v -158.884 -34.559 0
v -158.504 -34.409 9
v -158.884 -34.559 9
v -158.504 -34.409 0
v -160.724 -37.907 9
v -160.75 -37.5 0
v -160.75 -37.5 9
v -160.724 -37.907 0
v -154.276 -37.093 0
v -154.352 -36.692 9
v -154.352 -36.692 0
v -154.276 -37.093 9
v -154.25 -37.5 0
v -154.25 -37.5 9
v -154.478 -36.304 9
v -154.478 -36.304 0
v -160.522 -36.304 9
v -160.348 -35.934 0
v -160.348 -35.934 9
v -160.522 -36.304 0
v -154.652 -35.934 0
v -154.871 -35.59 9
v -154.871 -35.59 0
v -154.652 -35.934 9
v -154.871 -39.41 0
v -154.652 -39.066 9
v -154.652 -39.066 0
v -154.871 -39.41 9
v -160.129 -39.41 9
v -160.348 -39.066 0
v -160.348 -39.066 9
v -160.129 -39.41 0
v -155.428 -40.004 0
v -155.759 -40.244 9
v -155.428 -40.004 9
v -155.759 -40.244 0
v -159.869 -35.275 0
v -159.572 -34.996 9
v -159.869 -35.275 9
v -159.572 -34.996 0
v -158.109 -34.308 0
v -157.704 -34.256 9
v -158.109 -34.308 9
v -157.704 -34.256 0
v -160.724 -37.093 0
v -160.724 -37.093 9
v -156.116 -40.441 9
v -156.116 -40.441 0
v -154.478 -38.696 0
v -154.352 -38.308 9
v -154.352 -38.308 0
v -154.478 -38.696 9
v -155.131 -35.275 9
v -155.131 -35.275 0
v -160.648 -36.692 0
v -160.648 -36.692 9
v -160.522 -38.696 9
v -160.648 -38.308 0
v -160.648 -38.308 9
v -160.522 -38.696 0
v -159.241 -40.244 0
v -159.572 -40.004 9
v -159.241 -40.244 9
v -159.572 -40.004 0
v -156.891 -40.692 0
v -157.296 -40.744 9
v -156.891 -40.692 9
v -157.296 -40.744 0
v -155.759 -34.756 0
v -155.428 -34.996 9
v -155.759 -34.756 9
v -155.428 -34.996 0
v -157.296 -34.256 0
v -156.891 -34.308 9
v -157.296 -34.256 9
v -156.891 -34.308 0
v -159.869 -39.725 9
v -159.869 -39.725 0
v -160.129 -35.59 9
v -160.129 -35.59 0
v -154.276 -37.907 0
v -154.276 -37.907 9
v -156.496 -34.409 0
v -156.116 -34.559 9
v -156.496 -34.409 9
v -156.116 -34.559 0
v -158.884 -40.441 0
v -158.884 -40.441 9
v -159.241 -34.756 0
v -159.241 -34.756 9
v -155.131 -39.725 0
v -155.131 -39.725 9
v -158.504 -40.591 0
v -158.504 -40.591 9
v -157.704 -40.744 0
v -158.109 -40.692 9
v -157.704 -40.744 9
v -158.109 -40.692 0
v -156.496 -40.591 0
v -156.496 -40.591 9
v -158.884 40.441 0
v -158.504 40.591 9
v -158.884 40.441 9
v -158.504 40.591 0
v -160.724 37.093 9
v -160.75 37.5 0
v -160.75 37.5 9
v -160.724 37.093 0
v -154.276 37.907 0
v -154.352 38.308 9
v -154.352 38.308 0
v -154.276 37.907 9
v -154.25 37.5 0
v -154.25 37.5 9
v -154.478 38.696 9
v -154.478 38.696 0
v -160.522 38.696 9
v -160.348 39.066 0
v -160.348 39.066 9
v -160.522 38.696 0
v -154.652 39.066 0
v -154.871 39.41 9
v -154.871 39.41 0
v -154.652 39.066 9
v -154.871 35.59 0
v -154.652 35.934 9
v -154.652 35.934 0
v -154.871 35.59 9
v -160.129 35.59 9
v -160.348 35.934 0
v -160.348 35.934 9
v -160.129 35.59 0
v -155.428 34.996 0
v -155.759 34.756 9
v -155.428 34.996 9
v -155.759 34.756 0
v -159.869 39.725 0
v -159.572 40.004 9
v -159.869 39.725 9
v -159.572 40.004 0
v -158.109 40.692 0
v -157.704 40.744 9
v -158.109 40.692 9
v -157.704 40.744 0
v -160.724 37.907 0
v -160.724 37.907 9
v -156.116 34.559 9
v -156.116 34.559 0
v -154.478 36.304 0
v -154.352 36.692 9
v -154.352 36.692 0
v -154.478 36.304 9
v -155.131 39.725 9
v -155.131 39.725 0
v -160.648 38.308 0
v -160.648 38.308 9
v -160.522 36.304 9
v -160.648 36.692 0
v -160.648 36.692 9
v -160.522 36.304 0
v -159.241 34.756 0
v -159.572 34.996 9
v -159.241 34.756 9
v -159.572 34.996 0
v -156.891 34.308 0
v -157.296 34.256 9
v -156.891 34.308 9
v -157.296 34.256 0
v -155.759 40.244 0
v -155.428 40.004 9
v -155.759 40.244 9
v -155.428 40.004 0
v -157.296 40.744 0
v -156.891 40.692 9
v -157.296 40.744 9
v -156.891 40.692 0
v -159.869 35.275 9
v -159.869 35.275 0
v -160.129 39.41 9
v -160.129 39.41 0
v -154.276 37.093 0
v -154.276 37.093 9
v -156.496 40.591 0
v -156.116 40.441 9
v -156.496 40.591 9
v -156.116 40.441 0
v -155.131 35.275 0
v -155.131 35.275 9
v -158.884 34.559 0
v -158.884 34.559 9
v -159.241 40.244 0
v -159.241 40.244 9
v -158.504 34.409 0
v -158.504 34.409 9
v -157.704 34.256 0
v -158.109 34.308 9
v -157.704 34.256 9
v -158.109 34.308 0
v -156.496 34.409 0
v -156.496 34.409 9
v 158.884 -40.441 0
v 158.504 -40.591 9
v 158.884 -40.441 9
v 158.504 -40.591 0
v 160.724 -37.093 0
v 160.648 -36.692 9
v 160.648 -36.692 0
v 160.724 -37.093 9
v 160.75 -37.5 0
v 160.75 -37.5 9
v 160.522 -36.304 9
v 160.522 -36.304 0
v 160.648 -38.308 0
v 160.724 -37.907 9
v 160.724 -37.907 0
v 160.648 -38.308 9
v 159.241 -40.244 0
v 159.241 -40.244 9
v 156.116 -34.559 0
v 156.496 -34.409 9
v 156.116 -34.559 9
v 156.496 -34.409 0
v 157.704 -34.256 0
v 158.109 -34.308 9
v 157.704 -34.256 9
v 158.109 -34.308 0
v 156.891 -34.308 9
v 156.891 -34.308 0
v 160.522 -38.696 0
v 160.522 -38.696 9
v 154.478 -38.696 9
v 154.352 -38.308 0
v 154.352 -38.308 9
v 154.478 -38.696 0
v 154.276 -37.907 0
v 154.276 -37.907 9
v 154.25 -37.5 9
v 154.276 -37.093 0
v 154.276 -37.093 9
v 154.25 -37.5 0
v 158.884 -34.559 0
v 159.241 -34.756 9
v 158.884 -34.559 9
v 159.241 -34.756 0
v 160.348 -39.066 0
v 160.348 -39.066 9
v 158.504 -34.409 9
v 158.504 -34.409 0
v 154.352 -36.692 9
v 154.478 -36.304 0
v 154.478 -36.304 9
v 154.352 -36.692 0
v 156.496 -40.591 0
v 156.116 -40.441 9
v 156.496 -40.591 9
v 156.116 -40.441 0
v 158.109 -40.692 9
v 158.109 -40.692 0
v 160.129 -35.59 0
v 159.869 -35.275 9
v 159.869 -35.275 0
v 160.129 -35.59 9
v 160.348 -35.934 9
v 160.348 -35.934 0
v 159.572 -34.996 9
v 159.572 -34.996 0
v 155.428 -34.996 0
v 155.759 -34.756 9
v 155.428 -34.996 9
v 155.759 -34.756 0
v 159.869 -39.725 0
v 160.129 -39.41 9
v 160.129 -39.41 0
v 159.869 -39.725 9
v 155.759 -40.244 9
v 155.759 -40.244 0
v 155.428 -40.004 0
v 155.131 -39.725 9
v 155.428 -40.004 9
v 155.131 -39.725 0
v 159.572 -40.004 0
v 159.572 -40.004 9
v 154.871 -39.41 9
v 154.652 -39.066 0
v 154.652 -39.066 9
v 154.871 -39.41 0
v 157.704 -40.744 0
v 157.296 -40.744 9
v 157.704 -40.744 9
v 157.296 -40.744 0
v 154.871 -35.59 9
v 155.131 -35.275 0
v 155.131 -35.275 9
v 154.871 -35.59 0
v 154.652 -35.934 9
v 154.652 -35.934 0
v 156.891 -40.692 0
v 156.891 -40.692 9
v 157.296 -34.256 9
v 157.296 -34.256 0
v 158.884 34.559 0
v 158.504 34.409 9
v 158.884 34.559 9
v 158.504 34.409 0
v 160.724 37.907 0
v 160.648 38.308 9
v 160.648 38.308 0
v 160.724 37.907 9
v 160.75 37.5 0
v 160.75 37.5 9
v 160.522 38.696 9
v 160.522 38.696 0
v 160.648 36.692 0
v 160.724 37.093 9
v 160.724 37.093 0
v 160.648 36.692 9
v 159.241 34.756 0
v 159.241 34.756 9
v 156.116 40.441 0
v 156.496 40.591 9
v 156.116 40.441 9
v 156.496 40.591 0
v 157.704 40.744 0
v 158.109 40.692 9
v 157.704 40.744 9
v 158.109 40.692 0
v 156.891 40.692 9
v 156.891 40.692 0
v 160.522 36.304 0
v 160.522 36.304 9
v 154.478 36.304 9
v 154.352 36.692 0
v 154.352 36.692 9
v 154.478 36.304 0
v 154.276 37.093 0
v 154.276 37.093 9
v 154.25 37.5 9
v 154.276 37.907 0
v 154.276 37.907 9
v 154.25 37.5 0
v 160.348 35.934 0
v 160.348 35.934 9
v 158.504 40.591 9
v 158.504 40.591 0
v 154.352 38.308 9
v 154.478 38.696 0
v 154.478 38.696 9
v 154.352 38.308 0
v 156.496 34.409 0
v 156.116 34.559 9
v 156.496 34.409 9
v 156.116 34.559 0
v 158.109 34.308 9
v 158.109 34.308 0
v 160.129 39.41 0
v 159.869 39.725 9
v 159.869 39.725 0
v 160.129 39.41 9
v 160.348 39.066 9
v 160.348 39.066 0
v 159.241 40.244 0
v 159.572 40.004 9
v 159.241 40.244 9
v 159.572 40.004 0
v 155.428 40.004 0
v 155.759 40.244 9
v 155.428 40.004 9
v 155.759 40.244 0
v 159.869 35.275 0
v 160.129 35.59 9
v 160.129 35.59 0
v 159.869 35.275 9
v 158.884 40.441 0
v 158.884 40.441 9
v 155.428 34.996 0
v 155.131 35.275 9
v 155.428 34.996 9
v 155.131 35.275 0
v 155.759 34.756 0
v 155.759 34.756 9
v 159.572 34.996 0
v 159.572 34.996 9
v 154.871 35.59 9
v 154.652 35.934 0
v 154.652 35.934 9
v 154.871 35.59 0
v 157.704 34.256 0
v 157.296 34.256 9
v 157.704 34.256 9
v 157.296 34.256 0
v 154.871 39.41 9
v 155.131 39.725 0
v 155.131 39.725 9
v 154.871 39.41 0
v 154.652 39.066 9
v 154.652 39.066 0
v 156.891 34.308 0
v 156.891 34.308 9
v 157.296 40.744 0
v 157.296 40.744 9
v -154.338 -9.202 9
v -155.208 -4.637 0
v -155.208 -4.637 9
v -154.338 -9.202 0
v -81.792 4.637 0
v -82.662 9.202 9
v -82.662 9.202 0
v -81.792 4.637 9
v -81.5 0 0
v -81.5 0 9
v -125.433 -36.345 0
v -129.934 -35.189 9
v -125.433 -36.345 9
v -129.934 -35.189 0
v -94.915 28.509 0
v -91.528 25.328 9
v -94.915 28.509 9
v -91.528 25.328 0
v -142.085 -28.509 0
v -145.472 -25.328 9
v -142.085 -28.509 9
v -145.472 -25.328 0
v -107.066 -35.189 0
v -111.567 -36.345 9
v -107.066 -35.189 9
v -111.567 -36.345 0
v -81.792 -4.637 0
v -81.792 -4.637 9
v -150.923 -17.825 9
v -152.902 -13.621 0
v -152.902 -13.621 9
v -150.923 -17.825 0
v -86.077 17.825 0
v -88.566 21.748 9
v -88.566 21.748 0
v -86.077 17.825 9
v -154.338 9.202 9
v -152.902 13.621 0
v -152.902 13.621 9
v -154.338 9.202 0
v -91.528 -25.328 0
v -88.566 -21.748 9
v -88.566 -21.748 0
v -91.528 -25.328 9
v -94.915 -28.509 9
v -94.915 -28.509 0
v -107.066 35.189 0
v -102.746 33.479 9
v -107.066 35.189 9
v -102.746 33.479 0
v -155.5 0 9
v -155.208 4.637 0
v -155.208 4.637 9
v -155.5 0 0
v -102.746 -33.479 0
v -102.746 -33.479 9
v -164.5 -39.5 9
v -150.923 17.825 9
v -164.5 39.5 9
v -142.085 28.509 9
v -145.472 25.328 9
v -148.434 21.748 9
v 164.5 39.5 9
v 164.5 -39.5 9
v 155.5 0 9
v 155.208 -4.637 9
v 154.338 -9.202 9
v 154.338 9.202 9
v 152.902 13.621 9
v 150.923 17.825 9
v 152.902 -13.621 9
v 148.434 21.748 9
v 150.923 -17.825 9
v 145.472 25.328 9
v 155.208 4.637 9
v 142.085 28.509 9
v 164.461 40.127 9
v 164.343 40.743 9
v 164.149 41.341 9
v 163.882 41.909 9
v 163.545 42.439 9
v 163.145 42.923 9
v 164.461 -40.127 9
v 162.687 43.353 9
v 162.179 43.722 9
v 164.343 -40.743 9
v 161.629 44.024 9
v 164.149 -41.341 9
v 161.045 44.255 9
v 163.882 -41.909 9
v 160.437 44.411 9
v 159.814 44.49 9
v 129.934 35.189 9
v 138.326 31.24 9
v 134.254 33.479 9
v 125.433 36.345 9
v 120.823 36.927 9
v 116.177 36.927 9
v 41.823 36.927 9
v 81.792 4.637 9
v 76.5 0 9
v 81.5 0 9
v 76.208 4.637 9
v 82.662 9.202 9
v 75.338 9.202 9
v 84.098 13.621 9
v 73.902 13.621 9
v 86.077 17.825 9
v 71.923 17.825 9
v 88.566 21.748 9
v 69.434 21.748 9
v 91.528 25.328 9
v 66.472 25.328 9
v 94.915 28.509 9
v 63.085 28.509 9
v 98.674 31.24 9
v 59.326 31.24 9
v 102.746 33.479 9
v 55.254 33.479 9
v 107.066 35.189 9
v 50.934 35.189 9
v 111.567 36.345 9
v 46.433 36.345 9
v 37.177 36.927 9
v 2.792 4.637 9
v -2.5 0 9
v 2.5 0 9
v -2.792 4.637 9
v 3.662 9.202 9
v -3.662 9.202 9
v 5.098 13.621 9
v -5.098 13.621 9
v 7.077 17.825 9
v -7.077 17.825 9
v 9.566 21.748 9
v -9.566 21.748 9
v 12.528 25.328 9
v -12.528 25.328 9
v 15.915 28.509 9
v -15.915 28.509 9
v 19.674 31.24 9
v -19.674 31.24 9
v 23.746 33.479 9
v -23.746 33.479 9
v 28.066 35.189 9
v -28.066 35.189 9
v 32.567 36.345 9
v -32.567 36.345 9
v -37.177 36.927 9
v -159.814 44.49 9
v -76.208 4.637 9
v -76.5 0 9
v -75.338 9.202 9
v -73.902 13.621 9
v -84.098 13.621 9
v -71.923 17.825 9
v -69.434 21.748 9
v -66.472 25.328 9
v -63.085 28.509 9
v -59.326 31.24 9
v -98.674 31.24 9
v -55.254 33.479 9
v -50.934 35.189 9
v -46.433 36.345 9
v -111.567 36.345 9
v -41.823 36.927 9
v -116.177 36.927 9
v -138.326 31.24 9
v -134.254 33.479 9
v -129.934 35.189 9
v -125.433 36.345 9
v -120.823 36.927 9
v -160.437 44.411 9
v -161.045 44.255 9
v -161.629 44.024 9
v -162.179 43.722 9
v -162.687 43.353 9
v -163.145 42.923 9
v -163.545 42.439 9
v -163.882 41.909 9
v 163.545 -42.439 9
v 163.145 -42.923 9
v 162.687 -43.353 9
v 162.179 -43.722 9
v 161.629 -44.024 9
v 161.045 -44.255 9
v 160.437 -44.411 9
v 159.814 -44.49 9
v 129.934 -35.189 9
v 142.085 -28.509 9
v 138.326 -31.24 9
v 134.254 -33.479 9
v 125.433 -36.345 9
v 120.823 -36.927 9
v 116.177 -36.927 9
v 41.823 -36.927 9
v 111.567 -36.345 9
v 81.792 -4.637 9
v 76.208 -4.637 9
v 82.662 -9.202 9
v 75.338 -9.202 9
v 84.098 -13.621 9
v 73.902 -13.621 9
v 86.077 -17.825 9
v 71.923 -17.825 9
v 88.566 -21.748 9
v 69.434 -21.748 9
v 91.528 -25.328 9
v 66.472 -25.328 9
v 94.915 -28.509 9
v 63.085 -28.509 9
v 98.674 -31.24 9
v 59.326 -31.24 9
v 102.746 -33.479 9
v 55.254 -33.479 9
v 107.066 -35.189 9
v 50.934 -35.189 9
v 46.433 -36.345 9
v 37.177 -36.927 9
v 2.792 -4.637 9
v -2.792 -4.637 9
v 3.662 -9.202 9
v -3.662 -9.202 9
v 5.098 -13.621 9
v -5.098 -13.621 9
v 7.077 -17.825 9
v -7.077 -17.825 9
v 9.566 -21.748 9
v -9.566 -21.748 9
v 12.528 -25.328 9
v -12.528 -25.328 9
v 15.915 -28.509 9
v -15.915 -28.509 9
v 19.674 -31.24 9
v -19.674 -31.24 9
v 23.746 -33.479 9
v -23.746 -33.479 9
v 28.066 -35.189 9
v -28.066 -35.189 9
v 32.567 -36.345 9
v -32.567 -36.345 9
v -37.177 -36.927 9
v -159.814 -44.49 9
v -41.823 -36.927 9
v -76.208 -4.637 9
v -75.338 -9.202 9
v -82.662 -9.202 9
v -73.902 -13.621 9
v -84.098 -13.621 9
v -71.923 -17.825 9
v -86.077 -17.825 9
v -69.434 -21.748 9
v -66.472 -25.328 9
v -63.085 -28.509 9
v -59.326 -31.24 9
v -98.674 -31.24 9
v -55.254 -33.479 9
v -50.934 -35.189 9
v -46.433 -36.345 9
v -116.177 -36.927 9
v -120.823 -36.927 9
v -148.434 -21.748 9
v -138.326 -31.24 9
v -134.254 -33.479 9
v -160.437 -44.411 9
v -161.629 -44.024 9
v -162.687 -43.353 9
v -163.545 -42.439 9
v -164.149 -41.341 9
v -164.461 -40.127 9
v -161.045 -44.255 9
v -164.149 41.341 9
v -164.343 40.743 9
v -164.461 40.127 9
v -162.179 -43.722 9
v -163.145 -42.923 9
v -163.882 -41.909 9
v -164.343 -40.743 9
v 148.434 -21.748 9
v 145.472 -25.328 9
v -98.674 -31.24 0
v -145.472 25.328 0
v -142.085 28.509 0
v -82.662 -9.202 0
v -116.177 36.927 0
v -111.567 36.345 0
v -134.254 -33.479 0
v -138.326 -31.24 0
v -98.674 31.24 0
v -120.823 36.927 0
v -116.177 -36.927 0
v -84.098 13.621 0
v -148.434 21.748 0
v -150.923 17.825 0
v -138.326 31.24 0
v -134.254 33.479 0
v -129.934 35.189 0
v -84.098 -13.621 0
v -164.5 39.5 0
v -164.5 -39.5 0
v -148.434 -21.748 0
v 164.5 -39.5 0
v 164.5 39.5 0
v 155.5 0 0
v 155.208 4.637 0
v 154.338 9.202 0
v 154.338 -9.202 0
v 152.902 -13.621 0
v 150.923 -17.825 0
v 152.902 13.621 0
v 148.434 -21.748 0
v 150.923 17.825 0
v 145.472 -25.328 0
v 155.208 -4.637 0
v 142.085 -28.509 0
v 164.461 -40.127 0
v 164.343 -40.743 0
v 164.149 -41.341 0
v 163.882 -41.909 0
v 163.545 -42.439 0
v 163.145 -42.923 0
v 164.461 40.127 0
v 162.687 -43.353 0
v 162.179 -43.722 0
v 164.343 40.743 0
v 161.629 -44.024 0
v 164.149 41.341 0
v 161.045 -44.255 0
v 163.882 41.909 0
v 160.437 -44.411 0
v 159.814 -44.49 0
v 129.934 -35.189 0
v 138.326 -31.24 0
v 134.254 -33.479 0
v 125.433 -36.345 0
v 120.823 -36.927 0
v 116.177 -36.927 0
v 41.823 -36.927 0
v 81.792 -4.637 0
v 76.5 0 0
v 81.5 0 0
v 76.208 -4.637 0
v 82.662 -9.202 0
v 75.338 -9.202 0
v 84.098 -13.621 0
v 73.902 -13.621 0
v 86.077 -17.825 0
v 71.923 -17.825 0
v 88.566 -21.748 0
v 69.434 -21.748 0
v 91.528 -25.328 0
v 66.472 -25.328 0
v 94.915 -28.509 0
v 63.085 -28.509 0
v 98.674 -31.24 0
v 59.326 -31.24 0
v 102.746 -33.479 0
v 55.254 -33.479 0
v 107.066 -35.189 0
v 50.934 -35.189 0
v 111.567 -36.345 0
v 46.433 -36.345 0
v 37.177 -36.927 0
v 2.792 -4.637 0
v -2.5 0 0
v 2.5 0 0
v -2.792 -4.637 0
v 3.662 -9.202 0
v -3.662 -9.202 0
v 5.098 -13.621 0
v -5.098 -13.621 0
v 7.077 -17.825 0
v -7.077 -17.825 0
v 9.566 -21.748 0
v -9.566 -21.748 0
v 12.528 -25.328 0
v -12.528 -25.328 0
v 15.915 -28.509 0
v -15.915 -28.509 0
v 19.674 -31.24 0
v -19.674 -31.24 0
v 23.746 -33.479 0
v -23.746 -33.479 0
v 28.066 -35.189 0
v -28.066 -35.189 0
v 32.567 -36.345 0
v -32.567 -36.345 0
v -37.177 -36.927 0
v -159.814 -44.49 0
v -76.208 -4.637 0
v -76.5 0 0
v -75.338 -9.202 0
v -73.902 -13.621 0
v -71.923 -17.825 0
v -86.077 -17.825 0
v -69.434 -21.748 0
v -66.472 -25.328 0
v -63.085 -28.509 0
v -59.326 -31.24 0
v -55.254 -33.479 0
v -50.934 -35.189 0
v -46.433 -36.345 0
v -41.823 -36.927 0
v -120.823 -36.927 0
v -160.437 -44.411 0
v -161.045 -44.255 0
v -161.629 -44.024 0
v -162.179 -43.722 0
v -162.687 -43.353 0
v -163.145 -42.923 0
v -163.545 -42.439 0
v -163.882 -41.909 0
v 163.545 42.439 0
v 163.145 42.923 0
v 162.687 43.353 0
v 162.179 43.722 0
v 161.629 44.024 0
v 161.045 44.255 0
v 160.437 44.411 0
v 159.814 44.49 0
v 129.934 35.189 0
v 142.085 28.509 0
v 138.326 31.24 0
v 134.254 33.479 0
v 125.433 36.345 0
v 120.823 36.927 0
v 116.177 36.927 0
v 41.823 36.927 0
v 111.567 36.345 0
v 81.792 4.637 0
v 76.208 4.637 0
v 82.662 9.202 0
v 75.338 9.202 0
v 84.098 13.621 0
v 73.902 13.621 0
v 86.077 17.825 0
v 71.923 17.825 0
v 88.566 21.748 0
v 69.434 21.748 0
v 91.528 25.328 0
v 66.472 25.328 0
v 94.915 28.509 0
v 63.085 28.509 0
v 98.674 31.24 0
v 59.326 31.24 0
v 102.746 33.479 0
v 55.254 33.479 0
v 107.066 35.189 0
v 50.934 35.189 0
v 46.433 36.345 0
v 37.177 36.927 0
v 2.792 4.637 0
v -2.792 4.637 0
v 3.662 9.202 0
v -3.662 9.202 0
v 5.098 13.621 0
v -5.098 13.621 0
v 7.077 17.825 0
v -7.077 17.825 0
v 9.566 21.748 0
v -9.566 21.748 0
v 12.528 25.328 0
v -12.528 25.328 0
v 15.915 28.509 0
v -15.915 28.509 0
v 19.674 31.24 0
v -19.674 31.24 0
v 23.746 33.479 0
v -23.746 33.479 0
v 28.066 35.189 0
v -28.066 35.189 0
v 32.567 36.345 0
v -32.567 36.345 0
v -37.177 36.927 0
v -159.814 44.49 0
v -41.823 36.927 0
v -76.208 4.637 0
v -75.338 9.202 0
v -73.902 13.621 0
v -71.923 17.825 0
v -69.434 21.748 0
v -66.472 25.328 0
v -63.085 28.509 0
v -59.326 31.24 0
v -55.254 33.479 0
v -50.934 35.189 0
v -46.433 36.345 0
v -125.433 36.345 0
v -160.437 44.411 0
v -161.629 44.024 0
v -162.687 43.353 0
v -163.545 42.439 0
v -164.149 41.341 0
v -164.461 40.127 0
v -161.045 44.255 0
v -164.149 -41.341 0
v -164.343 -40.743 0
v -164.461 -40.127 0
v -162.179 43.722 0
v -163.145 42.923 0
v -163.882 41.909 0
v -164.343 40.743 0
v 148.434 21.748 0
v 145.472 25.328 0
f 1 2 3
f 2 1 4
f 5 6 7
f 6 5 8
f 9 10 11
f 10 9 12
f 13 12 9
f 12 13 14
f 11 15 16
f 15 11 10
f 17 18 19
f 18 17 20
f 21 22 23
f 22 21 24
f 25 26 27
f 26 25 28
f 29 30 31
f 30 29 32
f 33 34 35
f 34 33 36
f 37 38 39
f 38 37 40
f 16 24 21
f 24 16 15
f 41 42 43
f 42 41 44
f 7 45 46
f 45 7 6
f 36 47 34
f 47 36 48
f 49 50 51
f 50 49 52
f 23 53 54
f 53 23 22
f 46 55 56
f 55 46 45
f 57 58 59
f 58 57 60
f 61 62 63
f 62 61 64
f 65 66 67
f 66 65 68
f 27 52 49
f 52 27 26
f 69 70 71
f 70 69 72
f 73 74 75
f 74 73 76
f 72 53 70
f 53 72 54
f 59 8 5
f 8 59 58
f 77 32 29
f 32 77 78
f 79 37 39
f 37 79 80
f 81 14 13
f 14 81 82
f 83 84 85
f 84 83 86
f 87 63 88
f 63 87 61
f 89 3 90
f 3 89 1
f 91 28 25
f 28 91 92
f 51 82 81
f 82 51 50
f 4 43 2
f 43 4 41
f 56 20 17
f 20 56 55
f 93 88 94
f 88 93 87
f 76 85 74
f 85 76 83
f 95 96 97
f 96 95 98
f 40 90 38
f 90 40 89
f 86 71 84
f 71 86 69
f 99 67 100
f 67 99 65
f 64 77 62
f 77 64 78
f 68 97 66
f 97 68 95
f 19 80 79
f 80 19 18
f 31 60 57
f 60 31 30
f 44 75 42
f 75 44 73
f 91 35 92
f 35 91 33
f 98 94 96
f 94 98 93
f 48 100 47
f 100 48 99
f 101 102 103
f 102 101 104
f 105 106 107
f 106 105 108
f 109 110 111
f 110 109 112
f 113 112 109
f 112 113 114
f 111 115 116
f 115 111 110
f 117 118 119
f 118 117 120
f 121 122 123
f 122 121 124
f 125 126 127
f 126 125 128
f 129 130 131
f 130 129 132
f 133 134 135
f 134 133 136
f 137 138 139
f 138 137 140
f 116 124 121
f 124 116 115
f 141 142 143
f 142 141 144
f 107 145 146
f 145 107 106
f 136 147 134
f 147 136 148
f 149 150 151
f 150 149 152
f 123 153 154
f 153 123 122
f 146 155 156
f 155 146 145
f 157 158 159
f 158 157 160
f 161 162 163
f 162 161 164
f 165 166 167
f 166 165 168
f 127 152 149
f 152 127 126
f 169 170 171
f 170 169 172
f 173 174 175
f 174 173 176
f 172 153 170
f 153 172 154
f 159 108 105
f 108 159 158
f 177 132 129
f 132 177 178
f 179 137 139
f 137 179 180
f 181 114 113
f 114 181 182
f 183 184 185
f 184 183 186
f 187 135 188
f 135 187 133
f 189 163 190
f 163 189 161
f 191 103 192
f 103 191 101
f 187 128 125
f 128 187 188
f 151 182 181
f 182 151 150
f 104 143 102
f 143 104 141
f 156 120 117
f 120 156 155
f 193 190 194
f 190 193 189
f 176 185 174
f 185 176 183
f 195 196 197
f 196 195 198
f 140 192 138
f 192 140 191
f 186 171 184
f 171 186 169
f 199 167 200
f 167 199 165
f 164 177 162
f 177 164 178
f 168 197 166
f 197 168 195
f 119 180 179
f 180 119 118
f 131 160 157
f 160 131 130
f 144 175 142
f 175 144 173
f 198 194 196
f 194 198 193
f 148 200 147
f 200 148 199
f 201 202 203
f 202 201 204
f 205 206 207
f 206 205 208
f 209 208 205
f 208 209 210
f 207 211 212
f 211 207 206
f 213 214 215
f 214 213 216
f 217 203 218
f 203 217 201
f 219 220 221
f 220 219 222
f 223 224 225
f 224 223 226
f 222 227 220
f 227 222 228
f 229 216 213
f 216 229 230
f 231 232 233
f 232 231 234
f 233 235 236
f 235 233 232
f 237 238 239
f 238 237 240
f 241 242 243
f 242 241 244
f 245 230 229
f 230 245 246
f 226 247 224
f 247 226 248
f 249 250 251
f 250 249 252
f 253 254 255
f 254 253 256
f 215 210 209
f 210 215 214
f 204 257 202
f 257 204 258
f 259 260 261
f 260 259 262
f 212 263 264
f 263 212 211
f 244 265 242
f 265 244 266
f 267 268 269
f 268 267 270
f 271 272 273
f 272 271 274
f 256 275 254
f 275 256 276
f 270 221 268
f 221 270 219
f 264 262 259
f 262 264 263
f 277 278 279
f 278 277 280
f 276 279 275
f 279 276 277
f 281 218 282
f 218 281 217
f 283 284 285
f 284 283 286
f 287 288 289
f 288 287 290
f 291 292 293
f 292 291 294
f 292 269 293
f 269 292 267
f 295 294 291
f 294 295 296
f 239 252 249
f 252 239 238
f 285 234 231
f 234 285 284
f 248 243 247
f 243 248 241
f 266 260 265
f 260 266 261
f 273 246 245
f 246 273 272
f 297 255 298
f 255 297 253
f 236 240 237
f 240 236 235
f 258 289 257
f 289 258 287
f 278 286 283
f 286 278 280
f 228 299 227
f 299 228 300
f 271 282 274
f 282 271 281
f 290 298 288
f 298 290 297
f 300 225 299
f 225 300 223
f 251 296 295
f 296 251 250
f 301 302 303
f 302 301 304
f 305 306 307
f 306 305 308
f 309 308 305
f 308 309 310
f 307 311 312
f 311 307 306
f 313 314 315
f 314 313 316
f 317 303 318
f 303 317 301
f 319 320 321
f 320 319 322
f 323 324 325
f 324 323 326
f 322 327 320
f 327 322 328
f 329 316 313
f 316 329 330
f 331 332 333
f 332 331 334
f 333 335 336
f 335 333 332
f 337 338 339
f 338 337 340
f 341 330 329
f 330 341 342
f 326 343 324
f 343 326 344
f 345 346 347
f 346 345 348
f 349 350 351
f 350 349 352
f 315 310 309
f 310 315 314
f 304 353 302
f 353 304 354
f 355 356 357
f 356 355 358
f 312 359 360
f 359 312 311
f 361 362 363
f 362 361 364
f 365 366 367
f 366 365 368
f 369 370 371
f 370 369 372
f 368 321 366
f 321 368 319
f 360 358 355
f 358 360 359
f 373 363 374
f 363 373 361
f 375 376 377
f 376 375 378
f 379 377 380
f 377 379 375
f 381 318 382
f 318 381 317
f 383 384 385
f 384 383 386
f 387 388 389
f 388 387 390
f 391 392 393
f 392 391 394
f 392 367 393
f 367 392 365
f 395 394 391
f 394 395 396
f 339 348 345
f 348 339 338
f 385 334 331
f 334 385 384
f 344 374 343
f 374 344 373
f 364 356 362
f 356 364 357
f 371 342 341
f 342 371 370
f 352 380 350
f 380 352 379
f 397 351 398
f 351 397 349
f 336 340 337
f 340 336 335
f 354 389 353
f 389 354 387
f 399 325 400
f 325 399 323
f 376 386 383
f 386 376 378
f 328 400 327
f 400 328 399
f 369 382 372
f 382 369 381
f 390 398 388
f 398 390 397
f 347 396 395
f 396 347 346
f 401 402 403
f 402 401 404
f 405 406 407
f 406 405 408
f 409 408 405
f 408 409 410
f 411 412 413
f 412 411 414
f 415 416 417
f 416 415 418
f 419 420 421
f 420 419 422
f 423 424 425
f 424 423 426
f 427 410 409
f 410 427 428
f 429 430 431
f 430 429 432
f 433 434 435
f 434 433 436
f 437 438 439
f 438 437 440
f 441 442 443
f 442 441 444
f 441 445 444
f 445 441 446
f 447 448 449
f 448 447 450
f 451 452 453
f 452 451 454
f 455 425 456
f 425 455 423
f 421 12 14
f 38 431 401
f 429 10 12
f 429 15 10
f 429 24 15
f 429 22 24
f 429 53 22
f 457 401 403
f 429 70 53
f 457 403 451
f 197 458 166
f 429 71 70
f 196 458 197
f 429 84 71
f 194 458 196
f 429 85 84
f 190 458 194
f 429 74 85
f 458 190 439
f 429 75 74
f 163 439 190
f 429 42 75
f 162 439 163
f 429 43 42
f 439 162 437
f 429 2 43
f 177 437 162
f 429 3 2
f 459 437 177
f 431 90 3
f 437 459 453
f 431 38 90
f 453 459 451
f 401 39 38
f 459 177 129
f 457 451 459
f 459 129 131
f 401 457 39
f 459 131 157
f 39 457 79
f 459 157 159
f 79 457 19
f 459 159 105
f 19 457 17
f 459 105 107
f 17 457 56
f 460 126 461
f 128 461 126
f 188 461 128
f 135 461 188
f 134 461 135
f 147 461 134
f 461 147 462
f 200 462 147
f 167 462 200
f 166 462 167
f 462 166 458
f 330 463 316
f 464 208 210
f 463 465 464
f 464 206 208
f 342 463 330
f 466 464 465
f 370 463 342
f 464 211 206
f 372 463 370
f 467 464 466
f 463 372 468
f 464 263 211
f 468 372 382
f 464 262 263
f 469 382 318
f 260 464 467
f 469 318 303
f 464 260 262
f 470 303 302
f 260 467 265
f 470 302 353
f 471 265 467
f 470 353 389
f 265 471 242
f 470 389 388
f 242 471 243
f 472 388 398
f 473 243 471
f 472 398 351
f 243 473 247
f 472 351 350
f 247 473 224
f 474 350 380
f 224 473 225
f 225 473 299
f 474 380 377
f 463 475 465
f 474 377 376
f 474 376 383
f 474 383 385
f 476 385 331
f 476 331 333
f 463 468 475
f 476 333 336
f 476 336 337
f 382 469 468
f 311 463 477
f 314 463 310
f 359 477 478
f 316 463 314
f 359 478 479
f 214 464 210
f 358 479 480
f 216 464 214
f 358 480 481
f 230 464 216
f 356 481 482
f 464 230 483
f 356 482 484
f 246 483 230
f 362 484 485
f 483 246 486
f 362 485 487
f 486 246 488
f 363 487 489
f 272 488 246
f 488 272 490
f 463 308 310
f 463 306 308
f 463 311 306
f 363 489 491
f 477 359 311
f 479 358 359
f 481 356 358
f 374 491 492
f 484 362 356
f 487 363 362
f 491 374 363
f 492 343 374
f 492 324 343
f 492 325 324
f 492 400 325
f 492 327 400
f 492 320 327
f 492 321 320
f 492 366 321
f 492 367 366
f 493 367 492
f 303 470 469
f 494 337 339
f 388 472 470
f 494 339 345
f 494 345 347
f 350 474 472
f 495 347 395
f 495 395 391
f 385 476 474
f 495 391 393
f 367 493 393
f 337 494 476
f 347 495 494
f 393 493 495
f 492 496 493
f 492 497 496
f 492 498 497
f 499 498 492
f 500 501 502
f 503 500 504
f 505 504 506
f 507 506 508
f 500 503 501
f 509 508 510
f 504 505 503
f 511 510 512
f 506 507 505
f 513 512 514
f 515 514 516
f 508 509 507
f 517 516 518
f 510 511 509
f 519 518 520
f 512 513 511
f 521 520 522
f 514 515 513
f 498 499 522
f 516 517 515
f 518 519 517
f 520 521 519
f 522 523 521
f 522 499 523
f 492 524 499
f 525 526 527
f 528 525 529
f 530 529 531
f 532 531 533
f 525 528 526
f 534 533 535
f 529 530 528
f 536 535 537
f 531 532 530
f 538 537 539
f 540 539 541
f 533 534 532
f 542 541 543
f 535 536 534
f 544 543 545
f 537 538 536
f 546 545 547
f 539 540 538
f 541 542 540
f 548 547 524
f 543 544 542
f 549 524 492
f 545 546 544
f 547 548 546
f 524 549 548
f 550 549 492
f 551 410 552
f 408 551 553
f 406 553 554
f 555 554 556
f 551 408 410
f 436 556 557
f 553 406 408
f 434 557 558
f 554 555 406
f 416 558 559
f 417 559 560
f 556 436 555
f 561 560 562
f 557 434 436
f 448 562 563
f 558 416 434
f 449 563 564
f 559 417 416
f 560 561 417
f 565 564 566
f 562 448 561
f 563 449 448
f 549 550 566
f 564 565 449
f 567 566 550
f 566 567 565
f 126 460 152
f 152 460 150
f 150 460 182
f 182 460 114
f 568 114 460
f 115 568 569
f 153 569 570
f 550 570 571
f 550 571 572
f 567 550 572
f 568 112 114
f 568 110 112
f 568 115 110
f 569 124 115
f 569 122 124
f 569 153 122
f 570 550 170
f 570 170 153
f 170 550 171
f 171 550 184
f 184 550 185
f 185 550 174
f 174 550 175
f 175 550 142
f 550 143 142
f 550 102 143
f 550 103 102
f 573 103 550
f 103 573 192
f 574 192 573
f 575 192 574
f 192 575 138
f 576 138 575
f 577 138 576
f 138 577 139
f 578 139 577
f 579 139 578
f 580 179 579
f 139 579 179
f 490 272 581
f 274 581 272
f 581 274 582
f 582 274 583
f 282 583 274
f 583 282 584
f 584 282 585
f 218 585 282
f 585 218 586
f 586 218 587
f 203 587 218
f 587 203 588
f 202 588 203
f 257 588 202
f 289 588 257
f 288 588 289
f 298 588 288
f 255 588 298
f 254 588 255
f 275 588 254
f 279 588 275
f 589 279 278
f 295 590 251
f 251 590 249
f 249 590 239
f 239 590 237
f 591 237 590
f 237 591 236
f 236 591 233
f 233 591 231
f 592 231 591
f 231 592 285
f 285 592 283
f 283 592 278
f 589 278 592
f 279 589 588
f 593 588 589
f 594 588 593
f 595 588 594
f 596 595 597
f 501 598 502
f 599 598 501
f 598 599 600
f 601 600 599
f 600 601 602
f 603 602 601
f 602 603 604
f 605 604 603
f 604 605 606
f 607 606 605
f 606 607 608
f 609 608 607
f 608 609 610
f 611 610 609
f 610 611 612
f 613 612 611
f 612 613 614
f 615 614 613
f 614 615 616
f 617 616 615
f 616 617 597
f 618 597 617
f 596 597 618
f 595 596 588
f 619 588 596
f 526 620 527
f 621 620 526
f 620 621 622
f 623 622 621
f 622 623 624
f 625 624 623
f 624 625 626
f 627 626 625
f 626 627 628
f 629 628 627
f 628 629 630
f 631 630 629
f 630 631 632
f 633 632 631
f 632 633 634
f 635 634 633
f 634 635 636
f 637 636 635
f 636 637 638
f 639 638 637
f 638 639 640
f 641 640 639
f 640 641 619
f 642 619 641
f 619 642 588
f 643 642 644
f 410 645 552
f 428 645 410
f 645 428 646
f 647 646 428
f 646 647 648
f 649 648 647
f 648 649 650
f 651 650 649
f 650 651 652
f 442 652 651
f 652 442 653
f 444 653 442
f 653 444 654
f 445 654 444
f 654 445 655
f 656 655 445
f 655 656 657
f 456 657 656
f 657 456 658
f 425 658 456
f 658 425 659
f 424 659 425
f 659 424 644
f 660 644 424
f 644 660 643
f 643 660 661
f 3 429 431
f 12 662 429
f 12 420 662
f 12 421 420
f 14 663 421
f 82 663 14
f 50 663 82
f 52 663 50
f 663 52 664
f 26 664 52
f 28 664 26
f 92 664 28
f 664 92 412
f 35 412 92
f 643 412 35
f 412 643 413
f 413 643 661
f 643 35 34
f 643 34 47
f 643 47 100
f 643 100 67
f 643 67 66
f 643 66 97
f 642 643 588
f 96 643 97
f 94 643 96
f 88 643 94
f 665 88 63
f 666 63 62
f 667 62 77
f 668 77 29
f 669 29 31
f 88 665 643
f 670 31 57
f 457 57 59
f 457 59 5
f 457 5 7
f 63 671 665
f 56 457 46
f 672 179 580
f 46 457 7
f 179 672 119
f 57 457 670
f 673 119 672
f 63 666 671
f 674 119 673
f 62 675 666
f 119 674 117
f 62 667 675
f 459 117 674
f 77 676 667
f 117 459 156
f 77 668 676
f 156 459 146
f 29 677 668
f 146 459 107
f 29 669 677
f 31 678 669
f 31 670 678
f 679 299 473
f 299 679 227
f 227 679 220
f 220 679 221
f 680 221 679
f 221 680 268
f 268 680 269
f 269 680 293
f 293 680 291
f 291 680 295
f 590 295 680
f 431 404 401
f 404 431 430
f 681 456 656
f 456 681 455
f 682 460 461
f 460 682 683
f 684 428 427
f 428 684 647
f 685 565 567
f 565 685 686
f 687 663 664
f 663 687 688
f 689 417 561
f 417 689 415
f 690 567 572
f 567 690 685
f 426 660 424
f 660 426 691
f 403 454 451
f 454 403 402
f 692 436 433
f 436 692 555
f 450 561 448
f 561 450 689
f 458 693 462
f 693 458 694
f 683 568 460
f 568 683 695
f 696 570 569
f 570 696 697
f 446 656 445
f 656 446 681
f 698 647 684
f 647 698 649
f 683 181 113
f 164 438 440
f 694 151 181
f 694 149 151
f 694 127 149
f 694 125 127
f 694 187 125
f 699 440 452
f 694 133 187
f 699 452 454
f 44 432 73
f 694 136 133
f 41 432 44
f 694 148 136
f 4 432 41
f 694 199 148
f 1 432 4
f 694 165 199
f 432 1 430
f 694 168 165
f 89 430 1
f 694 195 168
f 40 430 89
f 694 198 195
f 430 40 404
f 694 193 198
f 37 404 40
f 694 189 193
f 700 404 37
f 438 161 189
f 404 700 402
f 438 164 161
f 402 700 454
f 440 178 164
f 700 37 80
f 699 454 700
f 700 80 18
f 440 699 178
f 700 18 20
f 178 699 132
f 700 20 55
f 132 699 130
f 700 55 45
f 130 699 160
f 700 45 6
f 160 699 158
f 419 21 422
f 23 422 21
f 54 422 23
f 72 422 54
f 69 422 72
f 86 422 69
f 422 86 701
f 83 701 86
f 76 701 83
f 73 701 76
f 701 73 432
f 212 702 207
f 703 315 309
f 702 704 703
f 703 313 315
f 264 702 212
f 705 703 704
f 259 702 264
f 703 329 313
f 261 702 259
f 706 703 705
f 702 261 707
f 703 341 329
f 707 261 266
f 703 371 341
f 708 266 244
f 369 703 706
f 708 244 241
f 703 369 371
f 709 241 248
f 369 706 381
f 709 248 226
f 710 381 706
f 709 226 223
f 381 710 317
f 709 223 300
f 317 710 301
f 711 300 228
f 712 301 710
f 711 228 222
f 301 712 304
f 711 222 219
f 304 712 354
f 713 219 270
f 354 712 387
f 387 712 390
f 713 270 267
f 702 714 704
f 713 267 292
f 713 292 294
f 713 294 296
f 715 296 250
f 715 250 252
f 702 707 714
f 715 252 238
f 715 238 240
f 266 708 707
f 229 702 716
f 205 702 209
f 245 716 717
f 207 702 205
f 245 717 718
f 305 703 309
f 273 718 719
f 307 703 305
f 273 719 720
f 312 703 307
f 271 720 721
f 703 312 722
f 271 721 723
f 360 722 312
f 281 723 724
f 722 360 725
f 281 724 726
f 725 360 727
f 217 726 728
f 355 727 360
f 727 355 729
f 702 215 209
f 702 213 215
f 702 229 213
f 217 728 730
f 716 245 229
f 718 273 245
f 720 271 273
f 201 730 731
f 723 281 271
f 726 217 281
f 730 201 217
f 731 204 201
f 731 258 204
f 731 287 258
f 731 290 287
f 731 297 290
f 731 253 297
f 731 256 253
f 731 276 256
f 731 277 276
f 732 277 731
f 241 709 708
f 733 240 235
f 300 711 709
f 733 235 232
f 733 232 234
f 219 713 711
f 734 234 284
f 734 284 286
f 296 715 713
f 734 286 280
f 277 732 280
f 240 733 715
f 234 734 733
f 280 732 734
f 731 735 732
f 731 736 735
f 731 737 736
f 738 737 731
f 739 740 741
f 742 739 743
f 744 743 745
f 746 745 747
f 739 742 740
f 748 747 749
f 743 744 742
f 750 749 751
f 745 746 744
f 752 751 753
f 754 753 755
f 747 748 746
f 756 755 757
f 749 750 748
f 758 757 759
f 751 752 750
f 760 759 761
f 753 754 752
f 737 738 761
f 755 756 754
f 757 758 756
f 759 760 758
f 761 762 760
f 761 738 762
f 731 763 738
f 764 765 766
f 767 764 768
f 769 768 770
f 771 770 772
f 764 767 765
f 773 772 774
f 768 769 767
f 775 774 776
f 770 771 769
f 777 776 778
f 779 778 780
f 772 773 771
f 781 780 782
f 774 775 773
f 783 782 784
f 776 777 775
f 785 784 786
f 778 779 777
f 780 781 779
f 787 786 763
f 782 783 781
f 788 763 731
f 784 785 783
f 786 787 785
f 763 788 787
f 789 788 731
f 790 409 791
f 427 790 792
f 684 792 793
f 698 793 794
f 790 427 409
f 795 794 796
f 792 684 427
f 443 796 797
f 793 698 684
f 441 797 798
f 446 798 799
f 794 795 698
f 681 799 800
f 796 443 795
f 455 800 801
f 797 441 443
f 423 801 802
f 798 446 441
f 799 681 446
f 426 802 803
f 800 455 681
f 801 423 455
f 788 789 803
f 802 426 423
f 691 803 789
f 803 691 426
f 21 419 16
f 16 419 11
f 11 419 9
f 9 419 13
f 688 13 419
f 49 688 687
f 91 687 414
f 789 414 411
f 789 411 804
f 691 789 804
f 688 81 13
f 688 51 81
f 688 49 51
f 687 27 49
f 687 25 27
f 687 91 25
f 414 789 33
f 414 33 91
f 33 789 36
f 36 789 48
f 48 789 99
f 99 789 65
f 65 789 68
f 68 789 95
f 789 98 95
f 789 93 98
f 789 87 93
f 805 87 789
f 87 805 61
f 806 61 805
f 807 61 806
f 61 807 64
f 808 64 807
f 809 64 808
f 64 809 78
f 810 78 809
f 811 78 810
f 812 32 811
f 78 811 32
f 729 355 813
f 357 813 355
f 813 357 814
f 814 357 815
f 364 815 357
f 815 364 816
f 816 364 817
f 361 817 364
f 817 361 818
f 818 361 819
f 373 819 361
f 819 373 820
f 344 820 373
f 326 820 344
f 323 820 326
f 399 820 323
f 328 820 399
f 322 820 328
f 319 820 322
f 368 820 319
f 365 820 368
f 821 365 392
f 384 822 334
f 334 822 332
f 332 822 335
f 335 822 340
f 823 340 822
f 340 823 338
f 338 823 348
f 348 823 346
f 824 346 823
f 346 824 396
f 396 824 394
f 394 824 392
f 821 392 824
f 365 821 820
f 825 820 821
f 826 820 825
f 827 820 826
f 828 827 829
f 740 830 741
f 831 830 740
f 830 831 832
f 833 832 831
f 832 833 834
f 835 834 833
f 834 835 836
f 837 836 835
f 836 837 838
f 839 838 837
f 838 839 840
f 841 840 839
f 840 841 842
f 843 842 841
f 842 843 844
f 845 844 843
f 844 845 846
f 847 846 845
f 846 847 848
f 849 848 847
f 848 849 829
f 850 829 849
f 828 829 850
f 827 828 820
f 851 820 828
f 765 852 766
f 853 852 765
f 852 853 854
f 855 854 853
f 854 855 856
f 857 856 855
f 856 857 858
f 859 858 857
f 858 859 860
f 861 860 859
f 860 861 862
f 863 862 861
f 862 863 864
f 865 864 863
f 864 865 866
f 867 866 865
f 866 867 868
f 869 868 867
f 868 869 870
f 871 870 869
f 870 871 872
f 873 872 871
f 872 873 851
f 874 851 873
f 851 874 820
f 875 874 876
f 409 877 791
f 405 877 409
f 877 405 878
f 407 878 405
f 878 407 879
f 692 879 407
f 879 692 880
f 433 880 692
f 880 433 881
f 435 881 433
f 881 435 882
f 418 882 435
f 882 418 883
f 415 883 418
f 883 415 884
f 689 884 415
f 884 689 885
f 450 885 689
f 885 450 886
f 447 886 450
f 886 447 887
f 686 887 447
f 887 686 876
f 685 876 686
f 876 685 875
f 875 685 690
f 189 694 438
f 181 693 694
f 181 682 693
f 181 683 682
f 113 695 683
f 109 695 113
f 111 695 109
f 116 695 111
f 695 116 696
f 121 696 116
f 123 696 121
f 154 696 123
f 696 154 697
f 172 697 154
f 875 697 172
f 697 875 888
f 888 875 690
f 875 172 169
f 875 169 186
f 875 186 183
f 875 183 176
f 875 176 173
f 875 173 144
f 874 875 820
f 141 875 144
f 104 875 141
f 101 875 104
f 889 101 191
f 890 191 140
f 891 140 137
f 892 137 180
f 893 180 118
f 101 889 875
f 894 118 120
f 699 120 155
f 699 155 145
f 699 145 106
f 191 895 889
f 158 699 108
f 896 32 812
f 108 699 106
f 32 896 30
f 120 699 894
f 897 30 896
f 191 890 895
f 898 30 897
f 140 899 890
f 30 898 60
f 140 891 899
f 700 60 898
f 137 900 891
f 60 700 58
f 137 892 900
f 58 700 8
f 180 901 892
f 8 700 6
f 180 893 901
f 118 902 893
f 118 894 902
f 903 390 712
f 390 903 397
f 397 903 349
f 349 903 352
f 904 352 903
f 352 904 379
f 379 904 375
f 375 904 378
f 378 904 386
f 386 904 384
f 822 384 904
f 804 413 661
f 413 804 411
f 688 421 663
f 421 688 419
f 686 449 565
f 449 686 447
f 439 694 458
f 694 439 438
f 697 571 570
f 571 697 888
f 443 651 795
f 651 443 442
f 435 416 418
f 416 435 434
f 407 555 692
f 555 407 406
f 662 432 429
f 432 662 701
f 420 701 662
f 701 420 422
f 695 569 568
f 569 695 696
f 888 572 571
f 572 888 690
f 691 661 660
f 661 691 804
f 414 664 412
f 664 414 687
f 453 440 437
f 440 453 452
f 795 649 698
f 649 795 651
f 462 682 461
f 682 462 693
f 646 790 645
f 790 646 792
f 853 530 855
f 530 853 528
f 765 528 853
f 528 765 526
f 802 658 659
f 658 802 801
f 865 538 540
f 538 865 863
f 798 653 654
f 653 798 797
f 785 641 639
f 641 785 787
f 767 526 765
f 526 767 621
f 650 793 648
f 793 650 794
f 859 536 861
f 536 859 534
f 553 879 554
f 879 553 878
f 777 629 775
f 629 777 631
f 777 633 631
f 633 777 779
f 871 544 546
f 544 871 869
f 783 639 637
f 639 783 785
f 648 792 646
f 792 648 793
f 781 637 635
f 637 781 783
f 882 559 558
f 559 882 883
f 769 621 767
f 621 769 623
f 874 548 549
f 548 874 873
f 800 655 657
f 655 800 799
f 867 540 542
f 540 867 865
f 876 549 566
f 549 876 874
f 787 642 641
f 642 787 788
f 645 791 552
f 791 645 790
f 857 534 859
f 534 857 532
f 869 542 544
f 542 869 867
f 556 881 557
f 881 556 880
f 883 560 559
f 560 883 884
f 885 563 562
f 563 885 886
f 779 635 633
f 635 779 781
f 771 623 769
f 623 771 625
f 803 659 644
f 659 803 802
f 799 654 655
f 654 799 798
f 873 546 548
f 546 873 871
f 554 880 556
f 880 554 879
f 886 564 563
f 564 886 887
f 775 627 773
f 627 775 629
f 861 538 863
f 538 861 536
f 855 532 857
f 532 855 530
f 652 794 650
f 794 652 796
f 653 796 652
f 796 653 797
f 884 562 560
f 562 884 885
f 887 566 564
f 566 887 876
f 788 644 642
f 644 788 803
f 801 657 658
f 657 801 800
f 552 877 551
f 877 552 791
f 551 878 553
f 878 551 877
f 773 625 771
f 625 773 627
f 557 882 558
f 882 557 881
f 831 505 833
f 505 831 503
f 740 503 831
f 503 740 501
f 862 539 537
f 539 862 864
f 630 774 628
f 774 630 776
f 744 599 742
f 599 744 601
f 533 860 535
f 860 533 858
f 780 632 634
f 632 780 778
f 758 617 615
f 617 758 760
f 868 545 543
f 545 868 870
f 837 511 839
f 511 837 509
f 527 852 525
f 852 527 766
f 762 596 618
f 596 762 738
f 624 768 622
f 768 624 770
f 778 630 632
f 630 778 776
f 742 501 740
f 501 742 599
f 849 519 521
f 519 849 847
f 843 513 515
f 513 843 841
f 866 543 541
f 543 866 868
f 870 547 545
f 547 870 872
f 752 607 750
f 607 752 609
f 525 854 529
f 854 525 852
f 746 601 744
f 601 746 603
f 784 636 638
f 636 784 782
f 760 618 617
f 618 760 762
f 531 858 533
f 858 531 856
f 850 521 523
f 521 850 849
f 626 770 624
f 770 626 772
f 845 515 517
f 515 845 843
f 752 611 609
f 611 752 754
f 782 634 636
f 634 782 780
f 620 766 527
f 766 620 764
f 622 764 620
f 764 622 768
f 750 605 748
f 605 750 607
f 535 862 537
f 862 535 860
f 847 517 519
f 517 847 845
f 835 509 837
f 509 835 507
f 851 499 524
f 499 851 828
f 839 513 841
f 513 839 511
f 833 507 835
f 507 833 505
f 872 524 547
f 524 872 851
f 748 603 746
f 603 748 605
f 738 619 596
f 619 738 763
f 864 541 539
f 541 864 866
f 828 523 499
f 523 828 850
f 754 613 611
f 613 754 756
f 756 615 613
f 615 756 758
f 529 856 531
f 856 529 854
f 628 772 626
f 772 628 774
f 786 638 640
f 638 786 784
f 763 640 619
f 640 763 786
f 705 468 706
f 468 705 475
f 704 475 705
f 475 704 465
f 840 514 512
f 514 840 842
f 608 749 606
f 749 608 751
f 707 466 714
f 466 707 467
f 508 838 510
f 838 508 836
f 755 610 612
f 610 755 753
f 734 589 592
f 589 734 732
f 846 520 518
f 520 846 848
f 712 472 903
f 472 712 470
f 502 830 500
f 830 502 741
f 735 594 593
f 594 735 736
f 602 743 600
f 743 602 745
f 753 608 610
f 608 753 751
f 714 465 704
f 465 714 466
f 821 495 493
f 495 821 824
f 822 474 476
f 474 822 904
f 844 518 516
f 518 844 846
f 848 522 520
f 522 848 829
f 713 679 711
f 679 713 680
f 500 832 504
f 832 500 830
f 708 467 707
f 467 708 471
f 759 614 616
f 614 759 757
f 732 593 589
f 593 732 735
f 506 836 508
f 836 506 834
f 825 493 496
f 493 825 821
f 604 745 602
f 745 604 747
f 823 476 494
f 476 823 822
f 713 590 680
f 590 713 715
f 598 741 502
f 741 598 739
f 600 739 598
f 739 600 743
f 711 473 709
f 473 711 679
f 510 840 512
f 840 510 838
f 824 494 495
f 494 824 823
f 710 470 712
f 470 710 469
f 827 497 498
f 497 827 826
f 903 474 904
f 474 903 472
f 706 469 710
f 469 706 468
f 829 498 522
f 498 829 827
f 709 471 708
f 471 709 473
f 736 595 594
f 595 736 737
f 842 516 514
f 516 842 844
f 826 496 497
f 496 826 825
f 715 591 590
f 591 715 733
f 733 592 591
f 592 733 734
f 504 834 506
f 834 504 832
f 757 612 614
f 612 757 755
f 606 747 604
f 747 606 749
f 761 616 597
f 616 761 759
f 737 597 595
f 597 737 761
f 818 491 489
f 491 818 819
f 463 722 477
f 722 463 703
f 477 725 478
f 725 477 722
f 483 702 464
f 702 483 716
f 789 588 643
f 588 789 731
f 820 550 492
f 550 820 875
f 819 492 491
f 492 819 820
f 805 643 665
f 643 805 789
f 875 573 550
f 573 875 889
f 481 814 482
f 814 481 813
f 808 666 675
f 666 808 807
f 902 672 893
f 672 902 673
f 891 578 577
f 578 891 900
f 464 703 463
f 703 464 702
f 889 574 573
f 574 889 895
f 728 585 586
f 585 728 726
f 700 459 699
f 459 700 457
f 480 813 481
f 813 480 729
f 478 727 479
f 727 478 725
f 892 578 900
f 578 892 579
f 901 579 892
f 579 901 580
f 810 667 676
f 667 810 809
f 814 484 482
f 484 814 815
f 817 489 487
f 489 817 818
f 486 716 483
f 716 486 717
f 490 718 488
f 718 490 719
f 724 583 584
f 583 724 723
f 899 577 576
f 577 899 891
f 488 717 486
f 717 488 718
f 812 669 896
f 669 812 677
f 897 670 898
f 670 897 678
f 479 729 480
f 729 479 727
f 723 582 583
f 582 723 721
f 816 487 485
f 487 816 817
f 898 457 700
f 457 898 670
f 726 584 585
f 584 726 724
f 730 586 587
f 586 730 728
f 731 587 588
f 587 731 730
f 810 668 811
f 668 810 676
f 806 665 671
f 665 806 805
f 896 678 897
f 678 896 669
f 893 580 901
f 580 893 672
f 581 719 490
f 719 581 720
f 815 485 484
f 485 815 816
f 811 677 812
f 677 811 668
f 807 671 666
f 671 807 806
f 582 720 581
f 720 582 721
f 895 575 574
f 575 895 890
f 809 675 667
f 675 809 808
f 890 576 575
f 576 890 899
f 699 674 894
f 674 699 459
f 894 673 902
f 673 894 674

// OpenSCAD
$fn = 50;

difference() {
	union() {
		hull() {
			translate(v = [-159.5, 39.5, 0]) {
				cylinder(h = 9, r = 5);
			}
			translate(v = [159.5, 39.5, 0]) {
				cylinder(h = 9, r = 5);
			}
			translate(v = [-159.5, -39.5, 0]) {
				cylinder(h = 9, r = 5);
			}
			translate(v = [159.5, -39.5, 0]) {
				cylinder(h = 9, r = 5);
			}
		}
	}
	union() {
		translate(v = [-157.5, -37.5, -100.0]) {
			cylinder(h = 200, r = 3.25);
		}
		translate(v = [-157.5, 37.5, -100.0]) {
			cylinder(h = 200, r = 3.25);
		}
		translate(v = [157.5, -37.5, -100.0]) {
			cylinder(h = 200, r = 3.25);
		}
		translate(v = [157.5, 37.5, -100.0]) {
			cylinder(h = 200, r = 3.25);
		}
		translate(v = [-157.5, -37.5, -100.0]) {
			cylinder(h = 200, r = 1.8);
		}
		translate(v = [-157.5, 37.5, -100.0]) {
			cylinder(h = 200, r = 1.8);
		}
		translate(v = [157.5, -37.5, -100.0]) {
			cylinder(h = 200, r = 1.8);
		}
		translate(v = [157.5, 37.5, -100.0]) {
			cylinder(h = 200, r = 1.8);
		}
		translate(v = [-118.5, 0, 0.0]) {
			cylinder(h = 9, r = 37.0);
		}
		translate(v = [-39.5, 0, 0.0]) {
			cylinder(h = 9, r = 37.0);
		}
		translate(v = [39.5, 0, 0.0]) {
			cylinder(h = 9, r = 37.0);
		}
		translate(v = [118.5, 0, 0.0]) {
			cylinder(h = 9, r = 37.0);
		}
	}
}
